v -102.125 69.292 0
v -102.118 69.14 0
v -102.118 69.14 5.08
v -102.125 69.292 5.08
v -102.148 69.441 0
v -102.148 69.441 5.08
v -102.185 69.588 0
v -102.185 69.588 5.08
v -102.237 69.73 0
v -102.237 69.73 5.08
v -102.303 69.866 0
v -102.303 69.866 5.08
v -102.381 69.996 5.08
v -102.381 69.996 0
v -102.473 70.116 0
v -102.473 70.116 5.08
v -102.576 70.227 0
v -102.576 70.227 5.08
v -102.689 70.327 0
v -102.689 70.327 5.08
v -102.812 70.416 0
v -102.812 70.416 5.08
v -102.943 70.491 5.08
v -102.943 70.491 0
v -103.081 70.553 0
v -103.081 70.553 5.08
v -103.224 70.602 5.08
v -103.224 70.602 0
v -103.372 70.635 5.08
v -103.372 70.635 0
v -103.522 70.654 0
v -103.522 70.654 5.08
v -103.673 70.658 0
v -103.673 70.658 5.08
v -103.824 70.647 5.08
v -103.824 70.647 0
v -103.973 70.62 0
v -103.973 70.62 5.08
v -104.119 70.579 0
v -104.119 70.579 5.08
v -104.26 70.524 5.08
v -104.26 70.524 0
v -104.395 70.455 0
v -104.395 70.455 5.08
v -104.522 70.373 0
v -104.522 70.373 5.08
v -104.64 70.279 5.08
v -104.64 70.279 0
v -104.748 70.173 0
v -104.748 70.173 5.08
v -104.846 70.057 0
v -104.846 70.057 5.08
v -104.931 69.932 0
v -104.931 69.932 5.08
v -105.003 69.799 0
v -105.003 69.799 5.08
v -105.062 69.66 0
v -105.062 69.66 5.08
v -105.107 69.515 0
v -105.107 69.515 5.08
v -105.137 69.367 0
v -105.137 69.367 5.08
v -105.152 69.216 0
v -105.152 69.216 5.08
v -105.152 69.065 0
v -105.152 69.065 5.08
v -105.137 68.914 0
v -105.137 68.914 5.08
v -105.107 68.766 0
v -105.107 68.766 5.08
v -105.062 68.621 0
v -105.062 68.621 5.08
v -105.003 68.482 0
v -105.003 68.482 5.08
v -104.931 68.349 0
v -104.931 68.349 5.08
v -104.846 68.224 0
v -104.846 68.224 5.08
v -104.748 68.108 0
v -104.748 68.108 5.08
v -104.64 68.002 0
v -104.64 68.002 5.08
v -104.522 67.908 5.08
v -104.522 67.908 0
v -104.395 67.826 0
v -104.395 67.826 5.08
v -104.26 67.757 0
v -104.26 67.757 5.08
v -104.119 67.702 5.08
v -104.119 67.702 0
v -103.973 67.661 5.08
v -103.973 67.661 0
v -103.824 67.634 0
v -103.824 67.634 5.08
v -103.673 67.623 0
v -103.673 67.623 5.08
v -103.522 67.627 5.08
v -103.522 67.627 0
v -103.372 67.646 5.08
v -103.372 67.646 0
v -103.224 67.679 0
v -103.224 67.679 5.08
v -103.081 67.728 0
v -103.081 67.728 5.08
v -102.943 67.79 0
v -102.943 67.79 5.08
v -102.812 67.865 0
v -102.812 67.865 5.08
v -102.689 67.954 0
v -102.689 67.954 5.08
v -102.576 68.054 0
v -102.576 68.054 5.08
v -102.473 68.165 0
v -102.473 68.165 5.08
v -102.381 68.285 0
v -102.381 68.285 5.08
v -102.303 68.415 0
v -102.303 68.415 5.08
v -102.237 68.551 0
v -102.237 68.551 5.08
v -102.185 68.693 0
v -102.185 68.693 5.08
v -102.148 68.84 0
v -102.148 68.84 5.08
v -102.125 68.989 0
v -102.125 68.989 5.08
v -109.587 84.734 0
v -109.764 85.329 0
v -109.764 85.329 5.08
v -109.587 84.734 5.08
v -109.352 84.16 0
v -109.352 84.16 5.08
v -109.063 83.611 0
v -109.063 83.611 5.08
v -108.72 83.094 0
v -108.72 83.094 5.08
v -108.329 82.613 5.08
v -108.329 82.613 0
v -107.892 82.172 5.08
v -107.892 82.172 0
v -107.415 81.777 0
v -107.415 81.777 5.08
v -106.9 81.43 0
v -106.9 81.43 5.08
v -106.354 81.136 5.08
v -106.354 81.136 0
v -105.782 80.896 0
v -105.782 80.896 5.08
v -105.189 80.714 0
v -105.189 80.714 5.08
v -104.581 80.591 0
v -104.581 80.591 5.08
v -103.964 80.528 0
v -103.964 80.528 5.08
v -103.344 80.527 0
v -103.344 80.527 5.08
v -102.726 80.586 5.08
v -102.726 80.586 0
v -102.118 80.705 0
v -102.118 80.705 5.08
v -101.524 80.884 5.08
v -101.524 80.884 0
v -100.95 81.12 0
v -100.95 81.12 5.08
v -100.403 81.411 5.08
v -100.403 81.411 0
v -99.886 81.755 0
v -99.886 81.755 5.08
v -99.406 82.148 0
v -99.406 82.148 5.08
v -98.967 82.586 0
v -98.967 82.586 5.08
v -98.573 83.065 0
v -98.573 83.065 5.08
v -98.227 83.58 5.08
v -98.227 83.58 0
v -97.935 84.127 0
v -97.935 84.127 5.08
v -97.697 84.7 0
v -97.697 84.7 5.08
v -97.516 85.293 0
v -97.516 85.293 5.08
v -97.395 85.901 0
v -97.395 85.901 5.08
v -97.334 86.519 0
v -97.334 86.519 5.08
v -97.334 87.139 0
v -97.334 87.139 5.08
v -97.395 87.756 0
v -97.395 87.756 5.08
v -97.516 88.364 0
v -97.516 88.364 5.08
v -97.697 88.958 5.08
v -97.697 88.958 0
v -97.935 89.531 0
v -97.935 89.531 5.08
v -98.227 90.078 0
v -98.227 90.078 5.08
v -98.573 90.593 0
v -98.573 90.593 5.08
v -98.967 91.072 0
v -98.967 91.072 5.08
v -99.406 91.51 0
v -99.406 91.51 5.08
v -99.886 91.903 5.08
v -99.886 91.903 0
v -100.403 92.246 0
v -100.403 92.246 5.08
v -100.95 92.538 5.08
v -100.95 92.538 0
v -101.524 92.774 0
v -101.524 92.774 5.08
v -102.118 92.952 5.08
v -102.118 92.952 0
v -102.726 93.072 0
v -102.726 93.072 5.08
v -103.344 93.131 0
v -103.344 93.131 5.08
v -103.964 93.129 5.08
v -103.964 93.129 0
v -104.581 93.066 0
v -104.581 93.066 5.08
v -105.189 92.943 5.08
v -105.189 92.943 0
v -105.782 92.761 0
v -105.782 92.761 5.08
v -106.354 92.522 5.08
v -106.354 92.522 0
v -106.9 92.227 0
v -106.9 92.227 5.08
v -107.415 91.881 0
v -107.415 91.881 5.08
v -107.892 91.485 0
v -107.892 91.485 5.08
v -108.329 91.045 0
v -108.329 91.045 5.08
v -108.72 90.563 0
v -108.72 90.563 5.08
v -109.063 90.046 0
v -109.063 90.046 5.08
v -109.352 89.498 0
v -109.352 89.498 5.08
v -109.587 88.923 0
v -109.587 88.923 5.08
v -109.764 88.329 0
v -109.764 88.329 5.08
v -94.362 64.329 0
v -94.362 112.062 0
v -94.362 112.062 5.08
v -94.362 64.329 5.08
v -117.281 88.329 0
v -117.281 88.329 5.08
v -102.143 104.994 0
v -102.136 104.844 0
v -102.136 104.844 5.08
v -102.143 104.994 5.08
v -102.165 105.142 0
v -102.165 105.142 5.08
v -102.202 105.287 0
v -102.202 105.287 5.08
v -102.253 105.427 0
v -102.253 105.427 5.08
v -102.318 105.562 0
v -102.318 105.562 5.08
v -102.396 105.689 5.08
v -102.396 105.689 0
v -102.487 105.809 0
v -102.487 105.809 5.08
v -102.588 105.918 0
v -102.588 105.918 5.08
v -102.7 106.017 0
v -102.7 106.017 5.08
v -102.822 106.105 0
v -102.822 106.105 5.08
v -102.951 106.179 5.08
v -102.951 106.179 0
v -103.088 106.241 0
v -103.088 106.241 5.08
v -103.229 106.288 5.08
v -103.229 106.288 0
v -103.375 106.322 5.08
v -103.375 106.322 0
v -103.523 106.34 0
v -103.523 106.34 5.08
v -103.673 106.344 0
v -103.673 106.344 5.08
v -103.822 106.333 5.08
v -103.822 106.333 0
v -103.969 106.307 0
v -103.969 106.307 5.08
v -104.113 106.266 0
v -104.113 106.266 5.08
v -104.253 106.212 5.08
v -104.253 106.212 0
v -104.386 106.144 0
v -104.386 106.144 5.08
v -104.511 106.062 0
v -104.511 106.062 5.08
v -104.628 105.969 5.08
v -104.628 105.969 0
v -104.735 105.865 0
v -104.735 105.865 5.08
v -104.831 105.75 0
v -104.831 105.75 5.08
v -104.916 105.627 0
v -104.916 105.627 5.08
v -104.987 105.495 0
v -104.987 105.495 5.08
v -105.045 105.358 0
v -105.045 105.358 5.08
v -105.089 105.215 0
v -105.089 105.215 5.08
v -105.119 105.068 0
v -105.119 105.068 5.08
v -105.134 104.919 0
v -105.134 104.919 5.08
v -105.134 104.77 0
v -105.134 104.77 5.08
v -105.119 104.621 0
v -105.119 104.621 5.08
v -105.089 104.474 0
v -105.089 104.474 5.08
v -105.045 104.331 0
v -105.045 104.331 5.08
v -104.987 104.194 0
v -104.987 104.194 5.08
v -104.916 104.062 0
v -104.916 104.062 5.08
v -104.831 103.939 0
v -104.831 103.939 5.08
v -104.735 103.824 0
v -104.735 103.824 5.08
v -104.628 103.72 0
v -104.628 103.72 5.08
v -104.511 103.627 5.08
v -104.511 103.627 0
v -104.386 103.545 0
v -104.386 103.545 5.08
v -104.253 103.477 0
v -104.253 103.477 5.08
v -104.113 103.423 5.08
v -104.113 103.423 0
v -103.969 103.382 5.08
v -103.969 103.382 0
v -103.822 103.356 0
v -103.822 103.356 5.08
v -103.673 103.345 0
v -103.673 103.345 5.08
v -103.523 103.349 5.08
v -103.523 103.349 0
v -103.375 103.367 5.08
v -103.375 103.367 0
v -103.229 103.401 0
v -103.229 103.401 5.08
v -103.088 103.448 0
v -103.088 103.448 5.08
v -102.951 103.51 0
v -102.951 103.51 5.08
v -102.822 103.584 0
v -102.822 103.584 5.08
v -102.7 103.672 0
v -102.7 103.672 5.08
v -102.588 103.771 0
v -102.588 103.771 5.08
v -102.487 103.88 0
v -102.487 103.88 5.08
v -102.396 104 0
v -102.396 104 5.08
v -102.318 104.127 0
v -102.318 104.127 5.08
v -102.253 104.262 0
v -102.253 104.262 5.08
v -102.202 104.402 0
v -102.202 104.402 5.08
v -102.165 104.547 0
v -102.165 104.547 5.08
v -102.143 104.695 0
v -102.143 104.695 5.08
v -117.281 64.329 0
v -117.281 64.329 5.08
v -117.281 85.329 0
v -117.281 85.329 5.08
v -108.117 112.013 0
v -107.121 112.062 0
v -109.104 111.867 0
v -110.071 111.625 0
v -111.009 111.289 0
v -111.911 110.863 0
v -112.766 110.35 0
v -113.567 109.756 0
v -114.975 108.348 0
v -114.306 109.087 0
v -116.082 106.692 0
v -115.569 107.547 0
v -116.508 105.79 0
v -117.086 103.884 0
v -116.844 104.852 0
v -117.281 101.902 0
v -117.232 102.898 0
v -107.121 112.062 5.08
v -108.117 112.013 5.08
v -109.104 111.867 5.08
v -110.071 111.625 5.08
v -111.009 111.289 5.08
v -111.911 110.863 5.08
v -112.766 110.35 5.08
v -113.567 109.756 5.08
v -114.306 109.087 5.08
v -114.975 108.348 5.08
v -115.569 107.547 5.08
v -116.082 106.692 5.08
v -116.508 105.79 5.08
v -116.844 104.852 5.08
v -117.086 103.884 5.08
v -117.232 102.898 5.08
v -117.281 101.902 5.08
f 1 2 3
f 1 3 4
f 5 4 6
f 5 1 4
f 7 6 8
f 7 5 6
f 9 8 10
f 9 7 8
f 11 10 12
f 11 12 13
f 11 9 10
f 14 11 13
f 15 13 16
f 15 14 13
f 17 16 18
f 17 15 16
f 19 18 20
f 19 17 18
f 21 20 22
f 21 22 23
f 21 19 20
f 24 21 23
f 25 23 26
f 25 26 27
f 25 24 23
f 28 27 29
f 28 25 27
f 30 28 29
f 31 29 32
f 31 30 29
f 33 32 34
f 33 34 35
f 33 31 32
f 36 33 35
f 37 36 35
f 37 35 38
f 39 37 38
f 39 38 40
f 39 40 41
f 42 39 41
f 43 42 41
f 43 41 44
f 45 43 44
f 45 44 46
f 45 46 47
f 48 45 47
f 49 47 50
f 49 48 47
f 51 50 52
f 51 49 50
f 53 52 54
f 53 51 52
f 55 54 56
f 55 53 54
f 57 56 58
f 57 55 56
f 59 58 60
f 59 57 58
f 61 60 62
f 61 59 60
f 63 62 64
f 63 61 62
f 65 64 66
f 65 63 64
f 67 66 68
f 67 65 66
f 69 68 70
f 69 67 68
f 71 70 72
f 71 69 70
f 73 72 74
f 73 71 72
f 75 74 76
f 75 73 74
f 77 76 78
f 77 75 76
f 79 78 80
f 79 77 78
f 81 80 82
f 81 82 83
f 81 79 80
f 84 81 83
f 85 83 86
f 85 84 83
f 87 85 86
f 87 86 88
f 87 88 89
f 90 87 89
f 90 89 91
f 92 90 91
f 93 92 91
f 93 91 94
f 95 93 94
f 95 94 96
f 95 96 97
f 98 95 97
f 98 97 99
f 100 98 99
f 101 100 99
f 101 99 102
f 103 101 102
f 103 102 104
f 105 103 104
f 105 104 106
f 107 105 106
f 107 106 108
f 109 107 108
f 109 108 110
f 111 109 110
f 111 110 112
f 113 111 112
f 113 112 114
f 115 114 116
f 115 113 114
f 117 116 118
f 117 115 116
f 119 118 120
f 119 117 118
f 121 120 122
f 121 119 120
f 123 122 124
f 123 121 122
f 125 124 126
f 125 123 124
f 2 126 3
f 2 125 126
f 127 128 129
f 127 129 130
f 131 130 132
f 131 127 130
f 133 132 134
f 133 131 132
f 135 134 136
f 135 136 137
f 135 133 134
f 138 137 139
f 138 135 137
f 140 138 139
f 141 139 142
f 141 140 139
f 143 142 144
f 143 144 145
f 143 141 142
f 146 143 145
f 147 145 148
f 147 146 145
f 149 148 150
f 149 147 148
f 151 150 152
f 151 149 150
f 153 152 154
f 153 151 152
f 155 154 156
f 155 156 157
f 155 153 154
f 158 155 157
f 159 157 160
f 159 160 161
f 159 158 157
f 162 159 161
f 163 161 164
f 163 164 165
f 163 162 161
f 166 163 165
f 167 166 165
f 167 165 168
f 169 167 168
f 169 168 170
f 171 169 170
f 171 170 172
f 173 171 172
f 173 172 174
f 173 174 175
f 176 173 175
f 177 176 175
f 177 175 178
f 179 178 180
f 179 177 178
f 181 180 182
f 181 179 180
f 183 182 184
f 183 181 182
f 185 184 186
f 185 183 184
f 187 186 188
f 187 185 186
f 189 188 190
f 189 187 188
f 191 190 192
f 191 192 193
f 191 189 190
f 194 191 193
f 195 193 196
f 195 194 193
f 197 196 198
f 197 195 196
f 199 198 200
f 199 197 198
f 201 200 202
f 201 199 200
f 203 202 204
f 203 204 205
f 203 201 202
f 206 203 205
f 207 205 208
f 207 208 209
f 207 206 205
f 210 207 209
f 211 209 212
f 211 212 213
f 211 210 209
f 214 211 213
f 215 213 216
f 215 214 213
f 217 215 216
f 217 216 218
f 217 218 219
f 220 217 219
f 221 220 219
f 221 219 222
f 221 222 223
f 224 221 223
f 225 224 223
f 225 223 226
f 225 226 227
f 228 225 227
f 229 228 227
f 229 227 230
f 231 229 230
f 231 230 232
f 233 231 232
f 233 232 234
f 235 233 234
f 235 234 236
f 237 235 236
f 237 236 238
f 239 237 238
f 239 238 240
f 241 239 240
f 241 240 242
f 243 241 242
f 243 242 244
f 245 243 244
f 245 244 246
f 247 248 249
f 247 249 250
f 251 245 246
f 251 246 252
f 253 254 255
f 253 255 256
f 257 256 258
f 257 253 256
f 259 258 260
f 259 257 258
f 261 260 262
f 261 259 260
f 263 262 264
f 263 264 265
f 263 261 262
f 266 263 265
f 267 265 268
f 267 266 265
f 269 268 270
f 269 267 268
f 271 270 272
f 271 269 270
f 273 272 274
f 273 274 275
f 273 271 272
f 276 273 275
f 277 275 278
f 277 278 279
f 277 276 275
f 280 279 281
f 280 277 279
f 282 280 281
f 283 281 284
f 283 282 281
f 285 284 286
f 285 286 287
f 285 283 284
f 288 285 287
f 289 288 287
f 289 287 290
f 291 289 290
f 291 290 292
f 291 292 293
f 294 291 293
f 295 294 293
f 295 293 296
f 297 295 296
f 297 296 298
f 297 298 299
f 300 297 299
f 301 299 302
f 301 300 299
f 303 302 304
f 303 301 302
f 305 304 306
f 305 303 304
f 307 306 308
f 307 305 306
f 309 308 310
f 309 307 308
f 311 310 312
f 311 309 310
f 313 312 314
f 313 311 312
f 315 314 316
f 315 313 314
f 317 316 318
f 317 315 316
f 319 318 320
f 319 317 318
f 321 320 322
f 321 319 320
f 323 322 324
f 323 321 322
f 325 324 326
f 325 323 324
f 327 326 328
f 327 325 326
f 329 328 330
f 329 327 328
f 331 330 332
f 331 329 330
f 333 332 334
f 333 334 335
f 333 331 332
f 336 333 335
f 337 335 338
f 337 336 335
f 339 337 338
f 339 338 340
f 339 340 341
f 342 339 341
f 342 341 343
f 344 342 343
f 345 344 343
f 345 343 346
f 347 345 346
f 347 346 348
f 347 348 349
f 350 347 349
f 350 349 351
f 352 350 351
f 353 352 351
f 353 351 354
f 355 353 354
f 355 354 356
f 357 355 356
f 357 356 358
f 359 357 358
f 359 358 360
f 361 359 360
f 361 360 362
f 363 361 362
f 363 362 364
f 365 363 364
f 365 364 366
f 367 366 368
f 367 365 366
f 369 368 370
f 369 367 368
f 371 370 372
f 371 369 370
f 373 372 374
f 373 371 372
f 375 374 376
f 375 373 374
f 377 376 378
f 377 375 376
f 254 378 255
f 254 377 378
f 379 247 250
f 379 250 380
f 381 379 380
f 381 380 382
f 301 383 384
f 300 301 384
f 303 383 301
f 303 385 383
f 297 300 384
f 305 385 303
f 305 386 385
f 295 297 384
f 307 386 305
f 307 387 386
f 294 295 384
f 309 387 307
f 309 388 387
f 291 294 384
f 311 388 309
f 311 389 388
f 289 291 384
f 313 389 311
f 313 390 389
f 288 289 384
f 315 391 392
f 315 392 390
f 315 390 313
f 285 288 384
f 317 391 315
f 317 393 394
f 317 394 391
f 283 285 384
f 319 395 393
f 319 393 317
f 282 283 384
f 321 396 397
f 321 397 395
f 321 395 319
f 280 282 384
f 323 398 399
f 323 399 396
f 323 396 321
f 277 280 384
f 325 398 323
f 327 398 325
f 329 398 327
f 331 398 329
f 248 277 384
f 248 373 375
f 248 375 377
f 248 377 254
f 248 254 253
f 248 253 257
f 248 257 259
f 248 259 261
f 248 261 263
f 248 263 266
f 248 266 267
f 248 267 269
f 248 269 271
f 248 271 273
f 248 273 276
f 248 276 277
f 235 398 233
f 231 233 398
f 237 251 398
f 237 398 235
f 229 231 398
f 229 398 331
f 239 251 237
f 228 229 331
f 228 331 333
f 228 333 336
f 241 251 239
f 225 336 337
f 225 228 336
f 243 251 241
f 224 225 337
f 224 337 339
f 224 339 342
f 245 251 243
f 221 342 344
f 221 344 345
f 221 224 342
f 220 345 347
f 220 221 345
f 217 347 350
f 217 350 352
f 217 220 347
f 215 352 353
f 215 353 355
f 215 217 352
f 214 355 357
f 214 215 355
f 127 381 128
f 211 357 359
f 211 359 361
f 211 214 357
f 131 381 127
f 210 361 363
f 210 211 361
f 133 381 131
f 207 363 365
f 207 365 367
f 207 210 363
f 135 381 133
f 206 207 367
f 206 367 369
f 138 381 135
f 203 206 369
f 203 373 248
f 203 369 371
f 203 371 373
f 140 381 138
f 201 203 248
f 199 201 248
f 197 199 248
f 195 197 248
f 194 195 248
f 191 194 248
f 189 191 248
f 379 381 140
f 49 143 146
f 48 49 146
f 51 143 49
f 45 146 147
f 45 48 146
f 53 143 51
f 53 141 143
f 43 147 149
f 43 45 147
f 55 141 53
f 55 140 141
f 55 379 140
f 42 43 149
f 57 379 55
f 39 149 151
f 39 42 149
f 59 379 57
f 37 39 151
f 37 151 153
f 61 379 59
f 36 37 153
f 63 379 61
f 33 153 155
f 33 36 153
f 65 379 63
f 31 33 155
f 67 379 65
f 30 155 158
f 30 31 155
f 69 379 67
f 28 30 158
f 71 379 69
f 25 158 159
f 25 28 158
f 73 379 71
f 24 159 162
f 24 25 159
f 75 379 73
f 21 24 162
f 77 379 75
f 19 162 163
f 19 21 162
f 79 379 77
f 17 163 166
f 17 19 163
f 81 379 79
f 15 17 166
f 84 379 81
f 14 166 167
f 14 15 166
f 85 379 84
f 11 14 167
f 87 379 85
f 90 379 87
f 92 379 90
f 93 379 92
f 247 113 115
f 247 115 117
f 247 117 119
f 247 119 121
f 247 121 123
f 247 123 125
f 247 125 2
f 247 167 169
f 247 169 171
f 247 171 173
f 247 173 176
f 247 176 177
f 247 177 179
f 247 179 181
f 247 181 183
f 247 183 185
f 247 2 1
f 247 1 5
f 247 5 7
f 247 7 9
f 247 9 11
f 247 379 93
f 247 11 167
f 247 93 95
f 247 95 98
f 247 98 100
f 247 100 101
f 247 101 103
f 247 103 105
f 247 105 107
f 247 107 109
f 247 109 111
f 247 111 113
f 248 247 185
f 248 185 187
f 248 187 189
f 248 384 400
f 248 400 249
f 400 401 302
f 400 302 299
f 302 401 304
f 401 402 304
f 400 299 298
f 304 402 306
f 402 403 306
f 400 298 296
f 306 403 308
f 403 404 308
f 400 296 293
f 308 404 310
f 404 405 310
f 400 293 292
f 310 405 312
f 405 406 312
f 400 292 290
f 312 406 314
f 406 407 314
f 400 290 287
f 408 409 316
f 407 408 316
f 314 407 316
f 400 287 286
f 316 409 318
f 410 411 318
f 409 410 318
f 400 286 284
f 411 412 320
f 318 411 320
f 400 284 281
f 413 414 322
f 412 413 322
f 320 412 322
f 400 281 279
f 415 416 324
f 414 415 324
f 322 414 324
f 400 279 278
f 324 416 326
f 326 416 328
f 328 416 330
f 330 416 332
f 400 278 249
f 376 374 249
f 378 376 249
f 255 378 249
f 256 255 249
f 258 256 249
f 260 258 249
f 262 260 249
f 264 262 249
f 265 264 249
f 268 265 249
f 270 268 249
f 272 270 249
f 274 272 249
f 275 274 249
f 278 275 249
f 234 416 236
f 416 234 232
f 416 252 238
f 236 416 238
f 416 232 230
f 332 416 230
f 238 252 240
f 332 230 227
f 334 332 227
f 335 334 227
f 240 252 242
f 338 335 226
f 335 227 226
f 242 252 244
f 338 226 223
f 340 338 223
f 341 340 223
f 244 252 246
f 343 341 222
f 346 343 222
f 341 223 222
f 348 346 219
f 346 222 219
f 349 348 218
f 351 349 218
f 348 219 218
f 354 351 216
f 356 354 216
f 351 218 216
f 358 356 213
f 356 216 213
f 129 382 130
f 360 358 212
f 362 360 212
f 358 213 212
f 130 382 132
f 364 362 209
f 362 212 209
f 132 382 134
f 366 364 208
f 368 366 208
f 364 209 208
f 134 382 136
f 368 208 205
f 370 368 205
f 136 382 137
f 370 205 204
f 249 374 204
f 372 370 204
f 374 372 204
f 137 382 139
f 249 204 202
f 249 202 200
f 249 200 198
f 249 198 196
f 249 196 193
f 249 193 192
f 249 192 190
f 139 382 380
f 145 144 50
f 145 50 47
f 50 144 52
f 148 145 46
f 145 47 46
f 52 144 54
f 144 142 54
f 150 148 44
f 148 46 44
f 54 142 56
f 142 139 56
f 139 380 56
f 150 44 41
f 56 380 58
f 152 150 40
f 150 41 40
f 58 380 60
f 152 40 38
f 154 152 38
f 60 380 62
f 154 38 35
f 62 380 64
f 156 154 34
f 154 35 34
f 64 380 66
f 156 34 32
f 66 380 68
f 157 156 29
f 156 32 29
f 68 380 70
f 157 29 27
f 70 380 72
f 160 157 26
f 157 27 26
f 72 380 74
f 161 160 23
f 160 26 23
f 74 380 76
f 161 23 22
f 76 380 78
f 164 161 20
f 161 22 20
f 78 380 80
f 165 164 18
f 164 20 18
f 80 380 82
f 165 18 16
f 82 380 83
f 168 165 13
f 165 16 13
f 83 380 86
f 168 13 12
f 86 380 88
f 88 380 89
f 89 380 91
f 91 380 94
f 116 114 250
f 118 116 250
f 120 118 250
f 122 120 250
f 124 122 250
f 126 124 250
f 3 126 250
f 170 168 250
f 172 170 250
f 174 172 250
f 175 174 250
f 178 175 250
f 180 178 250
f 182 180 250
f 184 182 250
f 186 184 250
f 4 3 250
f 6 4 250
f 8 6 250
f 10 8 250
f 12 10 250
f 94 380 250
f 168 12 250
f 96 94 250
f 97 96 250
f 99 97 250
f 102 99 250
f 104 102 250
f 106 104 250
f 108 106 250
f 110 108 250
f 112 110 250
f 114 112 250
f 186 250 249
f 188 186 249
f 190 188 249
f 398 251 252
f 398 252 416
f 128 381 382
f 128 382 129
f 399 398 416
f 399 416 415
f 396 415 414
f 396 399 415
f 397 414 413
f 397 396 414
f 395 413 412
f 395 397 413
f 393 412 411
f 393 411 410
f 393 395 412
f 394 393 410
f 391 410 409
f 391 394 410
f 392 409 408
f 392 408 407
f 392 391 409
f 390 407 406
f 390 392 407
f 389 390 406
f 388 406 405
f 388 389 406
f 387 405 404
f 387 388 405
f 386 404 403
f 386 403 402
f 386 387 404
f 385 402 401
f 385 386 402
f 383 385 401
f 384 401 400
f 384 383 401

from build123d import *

# Parameters (mm, degrees)
SKETCH1_R           = 1.5
SKETCH1_R_2         = 1.517913389
BOSS_EXTRUDE1_DEPTH = 5.08


with BuildPart() as part:
    # Sketch1 → Boss-Extrude1 (new body)
    with BuildSketch(Plane(origin=(0, 0, 0), x_dir=(-1, 0, 0), z_dir=(0, 0, 1))):
        with BuildLine():
            Line((94.361674585, -64.328592097), (94.361674585, -111.794978321))
            Line((94.361674585, -111.794978321), (94.361674585, -112.062374013))
            Line((94.361674585, -112.062374013), (107.121412131, -112.062374013))
            ThreePointArc((107.121412131, -112.062374013), (114.305617027, -109.08657891), (117.281412131, -101.902374013))
            Line((117.281412131, -101.902374013), (117.281412131, -88.328738191))
            Line((117.281412131, -88.328738191), (113.735498826, -88.328738191))
            Line((113.735498826, -88.328738191), (110.405158411, -88.328738191))
            Line((110.405158411, -88.328738191), (109.76359006, -88.328738191))
            ThreePointArc((109.76359006, -88.328738191), (97.326662127, -86.828738191), (109.76359006, -85.328738191))
            Line((109.76359006, -85.328738191), (110.405158411, -85.328738191))
            Line((110.405158411, -85.328738191), (113.735498826, -85.328738191))
            Line((113.735498826, -85.328738191), (117.281412131, -85.328738191))
            Line((117.281412131, -85.328738191), (117.281412131, -64.328592097))
            Line((117.281412131, -64.328592097), (94.361674585, -64.328592097))
        make_face()
        with Locations((103.635582515, -104.844491412)):
            Circle(SKETCH1_R, mode=Mode.SUBTRACT)
        with Locations((103.635582515, -69.140487693)):
            Circle(SKETCH1_R_2, mode=Mode.SUBTRACT)
    extrude(amount=BOSS_EXTRUDE1_DEPTH)


solid = part.part
